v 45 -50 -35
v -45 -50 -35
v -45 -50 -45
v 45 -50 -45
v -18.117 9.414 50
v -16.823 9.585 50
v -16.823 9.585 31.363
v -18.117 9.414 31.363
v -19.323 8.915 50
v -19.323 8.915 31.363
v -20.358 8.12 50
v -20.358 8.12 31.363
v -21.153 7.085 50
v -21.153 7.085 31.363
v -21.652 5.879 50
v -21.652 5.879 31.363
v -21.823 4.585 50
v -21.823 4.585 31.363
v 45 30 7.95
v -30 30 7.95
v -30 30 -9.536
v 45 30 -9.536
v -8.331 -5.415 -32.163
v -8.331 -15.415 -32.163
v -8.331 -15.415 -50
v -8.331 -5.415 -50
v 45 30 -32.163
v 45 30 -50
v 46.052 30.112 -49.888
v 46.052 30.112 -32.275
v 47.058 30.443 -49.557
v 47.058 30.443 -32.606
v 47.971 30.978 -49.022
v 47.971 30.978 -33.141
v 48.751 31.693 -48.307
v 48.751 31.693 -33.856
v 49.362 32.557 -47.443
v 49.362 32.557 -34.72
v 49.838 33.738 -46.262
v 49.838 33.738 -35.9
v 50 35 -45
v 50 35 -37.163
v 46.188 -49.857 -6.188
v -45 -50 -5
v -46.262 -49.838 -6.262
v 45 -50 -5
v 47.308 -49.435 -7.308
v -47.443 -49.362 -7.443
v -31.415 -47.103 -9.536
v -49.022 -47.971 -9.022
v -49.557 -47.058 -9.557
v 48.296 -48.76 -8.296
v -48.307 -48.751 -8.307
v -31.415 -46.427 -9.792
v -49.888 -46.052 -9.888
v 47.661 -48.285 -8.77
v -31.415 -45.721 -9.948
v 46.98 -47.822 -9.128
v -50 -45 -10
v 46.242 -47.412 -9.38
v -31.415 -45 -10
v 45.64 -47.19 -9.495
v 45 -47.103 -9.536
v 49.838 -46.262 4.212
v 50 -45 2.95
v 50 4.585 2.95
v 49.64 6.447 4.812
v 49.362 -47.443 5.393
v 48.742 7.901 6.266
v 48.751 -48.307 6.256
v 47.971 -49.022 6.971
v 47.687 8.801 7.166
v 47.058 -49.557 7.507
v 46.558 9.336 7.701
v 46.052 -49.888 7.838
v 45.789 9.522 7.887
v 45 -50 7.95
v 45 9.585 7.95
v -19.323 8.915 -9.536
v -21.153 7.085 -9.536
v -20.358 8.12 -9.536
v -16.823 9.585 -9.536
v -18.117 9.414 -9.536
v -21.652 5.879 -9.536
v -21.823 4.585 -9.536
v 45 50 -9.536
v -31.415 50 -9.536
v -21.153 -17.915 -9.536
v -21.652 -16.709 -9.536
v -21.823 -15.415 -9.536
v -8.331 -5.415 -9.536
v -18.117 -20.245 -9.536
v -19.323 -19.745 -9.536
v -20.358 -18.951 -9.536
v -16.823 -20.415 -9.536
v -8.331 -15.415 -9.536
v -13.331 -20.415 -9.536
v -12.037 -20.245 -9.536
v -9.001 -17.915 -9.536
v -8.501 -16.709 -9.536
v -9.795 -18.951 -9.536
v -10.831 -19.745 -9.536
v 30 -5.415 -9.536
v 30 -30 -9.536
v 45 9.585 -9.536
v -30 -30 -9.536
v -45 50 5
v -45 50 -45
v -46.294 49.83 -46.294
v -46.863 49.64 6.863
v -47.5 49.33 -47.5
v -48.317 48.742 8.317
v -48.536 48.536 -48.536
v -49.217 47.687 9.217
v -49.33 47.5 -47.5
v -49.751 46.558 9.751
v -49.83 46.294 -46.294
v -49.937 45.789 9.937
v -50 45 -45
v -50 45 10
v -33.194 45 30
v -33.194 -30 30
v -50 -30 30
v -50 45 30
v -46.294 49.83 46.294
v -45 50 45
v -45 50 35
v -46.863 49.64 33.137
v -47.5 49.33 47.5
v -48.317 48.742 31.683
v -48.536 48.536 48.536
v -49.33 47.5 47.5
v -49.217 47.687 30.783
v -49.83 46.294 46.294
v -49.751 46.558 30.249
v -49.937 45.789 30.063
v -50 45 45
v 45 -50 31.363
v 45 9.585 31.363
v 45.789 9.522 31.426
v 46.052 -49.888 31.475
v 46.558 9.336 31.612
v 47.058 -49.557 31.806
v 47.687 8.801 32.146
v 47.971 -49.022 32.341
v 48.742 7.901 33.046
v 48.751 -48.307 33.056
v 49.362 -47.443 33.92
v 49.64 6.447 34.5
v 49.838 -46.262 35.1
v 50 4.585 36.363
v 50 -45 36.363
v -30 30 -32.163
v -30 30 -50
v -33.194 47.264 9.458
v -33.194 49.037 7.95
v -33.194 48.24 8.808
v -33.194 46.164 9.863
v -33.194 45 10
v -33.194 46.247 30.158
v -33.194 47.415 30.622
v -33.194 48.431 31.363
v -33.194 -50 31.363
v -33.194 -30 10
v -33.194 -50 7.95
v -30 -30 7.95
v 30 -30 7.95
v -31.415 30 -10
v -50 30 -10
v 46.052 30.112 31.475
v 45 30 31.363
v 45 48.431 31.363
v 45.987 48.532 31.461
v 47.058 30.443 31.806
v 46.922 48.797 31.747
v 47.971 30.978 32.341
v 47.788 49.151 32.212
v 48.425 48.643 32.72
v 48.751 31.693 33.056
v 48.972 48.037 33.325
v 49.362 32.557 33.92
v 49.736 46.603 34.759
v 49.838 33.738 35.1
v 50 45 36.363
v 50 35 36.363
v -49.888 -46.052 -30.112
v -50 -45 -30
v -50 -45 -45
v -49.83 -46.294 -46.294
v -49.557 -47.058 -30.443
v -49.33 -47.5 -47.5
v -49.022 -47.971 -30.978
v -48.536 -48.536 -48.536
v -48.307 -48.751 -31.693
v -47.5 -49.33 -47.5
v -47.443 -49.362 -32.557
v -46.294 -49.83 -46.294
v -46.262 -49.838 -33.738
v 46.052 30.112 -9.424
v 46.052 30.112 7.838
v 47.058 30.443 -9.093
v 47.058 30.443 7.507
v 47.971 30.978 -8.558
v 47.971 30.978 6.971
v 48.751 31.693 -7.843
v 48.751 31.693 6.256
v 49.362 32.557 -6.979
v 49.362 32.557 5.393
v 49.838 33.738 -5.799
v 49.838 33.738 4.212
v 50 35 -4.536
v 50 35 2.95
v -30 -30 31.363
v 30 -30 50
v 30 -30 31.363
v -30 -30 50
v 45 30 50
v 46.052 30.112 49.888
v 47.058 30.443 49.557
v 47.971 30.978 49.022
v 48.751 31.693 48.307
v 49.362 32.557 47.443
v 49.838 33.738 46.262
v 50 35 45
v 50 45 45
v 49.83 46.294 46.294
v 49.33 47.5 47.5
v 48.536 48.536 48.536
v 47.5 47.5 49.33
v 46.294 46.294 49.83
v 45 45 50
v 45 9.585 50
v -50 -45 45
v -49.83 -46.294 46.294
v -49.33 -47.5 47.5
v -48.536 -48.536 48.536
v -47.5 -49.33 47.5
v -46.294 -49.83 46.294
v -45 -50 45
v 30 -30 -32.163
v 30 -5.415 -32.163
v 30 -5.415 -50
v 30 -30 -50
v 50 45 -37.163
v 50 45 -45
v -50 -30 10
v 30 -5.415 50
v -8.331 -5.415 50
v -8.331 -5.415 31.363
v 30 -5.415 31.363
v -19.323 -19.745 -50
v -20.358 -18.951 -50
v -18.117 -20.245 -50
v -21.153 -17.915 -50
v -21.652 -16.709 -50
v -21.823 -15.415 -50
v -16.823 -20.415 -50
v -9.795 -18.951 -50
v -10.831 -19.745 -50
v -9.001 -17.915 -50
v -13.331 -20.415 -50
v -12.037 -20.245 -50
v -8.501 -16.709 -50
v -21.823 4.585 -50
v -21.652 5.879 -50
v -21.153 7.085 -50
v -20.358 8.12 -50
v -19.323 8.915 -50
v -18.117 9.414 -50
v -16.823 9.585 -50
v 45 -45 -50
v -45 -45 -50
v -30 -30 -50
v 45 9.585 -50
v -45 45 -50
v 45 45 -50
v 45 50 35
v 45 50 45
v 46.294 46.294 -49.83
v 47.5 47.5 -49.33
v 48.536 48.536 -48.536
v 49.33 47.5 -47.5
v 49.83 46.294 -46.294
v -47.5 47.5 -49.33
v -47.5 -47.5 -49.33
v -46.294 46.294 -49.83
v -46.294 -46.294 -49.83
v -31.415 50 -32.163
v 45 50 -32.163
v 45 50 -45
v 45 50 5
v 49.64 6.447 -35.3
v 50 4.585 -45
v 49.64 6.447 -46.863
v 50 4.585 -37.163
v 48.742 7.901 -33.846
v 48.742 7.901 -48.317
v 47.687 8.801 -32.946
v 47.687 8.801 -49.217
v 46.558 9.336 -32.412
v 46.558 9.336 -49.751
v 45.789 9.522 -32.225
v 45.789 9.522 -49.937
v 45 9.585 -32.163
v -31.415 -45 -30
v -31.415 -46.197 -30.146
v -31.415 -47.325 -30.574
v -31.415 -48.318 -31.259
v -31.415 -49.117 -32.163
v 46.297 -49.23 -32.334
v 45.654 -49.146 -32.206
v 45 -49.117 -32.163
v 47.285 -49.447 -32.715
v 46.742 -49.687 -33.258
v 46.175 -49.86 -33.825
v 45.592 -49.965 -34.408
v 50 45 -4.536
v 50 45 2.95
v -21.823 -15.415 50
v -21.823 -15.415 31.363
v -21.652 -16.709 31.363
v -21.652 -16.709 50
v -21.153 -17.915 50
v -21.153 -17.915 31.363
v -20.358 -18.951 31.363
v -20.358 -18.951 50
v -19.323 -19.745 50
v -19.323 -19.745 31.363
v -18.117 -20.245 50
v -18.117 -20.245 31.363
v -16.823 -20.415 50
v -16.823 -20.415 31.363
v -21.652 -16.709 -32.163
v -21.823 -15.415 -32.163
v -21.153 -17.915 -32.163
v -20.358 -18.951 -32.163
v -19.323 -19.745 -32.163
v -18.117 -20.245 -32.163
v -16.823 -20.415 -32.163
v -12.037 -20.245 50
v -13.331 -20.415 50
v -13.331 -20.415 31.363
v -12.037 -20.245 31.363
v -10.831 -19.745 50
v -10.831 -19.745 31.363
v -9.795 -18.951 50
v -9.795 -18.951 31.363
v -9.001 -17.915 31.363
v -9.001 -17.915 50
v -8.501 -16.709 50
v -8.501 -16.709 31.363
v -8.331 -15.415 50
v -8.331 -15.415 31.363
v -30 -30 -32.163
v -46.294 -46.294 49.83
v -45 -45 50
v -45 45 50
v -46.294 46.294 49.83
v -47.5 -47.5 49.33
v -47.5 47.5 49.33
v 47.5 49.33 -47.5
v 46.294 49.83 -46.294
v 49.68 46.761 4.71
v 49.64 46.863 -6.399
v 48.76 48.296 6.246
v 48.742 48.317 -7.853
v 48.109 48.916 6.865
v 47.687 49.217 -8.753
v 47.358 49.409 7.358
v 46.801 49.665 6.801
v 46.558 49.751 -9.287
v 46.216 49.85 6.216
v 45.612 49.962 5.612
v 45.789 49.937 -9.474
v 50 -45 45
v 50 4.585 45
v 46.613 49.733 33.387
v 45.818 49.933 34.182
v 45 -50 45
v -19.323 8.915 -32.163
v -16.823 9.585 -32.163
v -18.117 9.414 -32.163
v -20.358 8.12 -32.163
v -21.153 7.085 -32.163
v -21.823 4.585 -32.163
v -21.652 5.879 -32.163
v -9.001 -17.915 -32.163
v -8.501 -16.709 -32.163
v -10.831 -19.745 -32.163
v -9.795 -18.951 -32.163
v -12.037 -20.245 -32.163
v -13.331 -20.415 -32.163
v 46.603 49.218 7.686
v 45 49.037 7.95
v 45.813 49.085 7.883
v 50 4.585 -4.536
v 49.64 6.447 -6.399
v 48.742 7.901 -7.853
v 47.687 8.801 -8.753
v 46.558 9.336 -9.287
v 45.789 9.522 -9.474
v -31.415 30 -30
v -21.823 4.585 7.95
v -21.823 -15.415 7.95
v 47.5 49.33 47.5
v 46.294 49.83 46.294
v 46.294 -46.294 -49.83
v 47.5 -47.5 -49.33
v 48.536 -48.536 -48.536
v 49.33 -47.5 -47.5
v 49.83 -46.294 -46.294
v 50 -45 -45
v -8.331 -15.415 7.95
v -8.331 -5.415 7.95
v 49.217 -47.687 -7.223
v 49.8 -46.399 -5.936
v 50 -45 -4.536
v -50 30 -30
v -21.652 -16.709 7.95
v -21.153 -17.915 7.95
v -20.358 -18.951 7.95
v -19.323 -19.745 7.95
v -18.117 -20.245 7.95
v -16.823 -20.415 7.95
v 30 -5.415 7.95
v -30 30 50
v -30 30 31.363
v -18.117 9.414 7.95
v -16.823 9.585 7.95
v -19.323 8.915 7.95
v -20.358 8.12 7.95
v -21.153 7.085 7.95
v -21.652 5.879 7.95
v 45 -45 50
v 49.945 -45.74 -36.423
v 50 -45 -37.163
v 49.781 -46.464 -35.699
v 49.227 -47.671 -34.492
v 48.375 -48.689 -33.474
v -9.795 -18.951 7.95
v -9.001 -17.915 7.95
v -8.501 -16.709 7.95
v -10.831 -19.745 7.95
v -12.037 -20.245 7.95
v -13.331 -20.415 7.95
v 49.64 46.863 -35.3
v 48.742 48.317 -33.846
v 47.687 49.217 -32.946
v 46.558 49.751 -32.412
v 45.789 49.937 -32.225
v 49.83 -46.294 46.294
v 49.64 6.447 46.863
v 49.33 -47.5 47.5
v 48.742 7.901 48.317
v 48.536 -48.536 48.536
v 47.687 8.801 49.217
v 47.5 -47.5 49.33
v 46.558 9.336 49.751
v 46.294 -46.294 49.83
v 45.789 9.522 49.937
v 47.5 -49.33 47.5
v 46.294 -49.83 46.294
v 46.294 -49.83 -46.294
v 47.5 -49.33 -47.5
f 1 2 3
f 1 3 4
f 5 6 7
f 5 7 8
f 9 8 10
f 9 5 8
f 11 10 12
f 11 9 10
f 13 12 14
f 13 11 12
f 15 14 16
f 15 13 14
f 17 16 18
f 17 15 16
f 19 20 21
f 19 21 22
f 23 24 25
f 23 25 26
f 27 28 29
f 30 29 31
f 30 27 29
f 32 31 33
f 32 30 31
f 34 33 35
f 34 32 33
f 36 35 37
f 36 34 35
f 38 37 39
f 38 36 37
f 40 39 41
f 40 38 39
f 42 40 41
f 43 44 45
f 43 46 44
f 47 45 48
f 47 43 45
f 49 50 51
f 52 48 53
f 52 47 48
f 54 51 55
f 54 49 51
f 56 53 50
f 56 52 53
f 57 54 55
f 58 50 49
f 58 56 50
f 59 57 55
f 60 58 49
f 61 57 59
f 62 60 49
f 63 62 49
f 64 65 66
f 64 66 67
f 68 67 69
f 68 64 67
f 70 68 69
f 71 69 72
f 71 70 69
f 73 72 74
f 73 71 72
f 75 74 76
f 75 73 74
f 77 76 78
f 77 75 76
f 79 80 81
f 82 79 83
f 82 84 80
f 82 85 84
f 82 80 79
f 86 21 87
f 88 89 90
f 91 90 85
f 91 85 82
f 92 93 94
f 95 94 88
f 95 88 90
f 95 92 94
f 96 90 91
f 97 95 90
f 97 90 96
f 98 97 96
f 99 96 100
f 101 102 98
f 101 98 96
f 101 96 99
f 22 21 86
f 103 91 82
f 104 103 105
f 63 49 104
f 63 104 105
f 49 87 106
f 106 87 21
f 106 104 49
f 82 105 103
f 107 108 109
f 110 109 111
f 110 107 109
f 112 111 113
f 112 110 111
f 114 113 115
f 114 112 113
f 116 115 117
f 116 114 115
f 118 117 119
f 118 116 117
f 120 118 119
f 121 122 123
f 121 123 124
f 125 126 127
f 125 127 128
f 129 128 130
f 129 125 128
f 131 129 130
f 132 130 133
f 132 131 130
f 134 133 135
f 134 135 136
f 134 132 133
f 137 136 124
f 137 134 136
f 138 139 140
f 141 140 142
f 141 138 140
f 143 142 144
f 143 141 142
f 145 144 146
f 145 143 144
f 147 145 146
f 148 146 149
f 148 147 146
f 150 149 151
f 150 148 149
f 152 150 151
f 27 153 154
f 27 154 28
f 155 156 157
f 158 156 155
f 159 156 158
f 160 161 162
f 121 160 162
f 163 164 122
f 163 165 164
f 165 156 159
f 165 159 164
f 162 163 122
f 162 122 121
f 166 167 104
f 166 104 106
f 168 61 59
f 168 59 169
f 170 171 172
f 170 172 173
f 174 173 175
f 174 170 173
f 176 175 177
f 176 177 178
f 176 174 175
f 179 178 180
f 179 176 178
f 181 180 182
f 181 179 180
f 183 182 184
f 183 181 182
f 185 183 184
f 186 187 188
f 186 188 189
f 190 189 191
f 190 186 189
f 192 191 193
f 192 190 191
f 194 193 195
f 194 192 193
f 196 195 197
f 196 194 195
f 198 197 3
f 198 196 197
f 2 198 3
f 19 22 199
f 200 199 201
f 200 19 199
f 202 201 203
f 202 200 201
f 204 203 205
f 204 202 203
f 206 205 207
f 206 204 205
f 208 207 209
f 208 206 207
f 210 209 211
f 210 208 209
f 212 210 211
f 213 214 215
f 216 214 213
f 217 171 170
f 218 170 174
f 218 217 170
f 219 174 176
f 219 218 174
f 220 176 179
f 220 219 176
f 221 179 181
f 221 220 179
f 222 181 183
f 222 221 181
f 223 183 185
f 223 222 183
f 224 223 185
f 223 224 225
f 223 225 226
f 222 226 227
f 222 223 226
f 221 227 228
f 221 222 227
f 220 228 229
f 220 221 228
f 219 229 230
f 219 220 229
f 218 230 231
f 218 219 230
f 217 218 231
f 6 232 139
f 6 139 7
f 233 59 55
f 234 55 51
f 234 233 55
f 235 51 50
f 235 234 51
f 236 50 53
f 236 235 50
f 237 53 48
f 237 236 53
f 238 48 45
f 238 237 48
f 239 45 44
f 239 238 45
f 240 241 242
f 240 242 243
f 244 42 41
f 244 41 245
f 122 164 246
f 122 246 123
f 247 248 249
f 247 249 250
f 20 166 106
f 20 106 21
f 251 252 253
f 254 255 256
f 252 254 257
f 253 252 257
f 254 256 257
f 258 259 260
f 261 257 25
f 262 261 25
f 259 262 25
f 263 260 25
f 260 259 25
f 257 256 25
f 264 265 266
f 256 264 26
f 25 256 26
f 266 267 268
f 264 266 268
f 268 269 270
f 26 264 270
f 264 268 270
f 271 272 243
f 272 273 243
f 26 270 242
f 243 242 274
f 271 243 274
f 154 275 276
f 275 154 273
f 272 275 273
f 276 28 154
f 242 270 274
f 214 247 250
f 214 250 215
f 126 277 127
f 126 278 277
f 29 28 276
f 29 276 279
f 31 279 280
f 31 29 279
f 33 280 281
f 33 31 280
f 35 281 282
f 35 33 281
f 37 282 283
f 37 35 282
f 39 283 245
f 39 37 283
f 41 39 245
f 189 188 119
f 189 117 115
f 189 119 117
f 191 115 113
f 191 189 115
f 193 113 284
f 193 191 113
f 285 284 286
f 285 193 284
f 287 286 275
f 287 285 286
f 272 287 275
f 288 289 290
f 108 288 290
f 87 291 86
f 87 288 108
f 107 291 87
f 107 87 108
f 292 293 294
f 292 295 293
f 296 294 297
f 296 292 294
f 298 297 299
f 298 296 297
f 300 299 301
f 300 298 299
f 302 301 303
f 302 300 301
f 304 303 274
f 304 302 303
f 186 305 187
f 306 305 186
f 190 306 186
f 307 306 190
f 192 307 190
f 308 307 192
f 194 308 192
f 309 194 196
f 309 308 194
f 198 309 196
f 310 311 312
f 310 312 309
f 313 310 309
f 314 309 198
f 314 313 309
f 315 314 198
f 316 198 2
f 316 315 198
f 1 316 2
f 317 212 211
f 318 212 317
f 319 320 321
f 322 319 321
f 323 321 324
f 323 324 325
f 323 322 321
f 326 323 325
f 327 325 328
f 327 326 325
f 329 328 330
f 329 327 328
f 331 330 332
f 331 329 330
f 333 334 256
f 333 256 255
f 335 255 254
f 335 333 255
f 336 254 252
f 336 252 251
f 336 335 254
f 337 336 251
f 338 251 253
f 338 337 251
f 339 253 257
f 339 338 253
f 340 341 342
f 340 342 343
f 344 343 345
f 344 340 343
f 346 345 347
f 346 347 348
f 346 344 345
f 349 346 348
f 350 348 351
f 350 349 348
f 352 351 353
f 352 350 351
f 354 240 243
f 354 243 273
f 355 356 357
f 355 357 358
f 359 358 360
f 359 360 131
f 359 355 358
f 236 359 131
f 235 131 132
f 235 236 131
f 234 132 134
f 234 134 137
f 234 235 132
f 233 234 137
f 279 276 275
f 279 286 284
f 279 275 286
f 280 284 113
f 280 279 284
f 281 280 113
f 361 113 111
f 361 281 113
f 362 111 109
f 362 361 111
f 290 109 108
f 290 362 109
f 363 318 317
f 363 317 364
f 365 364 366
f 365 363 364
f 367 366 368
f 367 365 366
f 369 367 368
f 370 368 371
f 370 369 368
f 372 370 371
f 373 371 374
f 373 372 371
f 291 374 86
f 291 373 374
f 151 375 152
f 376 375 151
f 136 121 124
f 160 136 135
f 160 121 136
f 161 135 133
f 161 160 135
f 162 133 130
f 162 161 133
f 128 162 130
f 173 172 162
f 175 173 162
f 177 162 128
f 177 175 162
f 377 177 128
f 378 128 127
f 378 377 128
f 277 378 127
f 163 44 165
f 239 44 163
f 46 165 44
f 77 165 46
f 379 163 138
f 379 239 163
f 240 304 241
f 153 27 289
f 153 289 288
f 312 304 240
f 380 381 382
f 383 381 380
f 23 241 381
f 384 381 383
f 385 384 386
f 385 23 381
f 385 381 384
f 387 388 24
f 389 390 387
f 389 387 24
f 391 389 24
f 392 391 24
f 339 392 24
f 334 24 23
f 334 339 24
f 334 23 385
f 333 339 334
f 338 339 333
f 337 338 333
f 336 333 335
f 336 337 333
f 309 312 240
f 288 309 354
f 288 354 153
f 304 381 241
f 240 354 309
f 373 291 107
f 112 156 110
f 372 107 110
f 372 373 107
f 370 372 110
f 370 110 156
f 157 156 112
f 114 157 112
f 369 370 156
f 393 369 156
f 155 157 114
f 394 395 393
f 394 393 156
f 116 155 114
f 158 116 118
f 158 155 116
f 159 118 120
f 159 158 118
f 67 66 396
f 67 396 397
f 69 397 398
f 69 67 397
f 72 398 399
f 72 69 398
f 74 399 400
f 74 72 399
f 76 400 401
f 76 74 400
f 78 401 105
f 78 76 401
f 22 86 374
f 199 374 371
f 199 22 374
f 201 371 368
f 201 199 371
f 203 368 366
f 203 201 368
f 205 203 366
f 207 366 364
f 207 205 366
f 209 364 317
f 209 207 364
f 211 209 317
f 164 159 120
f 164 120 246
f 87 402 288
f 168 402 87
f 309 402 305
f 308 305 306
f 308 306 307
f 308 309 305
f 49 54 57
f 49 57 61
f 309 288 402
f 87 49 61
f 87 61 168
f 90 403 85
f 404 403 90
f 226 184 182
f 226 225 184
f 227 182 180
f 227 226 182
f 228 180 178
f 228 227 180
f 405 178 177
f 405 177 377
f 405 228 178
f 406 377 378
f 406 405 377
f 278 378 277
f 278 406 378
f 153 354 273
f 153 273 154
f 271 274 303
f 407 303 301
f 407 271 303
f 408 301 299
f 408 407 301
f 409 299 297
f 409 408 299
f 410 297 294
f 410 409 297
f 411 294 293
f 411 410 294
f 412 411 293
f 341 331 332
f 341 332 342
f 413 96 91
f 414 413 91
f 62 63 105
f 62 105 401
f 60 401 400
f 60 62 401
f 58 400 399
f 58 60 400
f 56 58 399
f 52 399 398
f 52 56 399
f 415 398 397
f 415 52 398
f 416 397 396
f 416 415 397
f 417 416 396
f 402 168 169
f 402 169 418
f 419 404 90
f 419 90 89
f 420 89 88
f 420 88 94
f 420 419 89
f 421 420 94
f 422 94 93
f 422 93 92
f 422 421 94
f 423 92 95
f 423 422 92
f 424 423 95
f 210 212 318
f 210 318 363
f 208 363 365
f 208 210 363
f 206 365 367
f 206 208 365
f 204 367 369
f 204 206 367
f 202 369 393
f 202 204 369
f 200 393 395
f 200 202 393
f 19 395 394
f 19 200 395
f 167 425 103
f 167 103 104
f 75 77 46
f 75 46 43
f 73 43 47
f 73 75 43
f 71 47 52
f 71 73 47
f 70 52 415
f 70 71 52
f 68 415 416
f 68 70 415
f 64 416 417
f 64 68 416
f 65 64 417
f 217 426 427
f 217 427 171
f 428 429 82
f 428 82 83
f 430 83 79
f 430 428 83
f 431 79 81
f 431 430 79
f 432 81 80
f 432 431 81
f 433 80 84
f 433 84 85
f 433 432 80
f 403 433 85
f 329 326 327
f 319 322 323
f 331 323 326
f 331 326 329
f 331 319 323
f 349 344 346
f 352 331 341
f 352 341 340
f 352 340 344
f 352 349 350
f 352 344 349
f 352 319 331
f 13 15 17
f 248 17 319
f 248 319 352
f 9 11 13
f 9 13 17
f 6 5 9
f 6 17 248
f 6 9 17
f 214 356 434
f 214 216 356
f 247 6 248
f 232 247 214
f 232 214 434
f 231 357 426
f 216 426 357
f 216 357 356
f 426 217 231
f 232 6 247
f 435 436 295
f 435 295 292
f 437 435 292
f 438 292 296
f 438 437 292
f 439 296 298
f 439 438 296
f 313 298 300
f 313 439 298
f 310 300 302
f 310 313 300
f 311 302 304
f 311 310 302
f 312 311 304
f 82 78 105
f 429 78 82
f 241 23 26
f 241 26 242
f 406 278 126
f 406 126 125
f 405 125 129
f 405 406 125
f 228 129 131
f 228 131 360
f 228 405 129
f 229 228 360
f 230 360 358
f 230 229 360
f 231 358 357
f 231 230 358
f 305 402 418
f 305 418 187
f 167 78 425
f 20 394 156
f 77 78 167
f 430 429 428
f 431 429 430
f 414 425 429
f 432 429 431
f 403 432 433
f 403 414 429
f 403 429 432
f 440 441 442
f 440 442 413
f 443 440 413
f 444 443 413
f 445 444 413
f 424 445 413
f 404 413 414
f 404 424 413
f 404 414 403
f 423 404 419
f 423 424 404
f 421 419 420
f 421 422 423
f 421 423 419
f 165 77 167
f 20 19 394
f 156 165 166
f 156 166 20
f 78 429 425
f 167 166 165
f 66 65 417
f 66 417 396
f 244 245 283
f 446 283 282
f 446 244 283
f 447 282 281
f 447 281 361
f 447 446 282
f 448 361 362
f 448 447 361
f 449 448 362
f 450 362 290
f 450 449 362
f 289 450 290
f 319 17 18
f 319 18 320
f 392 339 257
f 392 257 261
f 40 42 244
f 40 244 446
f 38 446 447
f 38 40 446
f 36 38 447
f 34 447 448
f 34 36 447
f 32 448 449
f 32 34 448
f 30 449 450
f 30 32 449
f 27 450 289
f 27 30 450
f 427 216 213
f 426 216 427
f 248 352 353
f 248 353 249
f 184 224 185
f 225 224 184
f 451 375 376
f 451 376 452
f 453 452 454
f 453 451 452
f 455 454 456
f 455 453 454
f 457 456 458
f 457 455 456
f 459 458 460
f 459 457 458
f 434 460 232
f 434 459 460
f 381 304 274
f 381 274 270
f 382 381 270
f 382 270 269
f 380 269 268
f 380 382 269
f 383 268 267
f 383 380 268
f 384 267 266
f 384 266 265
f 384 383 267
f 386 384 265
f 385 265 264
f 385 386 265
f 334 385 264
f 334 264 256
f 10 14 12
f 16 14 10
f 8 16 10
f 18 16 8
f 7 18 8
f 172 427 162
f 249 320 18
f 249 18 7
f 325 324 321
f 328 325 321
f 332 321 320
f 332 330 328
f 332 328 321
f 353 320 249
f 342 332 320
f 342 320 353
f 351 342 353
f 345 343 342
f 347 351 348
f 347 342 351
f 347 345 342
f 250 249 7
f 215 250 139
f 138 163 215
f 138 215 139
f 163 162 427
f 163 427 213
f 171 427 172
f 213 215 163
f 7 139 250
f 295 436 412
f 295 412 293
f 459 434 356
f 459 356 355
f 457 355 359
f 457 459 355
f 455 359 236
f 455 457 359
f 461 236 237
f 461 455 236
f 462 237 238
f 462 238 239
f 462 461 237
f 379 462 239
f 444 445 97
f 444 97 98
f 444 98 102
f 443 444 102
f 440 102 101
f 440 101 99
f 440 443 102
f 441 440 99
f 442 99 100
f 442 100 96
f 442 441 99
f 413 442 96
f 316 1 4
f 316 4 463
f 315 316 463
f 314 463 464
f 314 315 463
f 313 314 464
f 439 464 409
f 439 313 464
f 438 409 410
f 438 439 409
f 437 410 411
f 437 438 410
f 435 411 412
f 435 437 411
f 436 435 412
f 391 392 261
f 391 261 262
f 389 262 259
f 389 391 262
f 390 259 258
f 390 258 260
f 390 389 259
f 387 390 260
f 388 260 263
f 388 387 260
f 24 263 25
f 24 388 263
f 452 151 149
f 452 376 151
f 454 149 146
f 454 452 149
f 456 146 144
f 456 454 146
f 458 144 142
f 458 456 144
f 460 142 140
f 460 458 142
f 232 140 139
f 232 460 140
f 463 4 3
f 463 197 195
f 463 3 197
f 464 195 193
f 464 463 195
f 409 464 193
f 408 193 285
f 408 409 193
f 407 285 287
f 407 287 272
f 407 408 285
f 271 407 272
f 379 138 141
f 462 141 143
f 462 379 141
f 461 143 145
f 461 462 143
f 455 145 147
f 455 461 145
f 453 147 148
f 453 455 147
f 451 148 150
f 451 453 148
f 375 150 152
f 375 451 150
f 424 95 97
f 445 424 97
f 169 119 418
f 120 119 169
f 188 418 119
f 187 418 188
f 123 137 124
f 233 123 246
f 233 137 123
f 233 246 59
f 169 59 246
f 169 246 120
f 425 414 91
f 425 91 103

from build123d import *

# Parameters (mm, degrees)
F3_DEPTH = 50
F4_DEPTH = 50
F5_DEPTH = 50


with BuildPart() as f3:
    # F0 (on Top) → F3 (new body, symmetric)
    with BuildSketch(Plane.XY):
        with BuildLine():
            Line((-30, 30), (45, 30))
            ThreePointArc((45, 30), (48.535534, 31.464466), (50, 35))
            Line((50, 35), (50, 45))
            ThreePointArc((50, 45), (48.535534, 48.535534), (45, 50))
            Line((45, 50), (-45, 50))
            ThreePointArc((-45, 50), (-48.535534, 48.535534), (-50, 45))
            Line((-50, 45), (-50, -45))
            ThreePointArc((-50, -45), (-48.535534, -48.535534), (-45, -50))
            Line((-45, -50), (45, -50))
            ThreePointArc((45, -50), (48.535534, -48.535534), (50, -45))
            Line((50, -45), (50, 4.584678))
            ThreePointArc((50, 4.584678), (48.535534, 8.120212), (45, 9.584678))
            Line((45, 9.584678), (-16.822587, 9.584678))
            ThreePointArc((-16.822587, 9.584678), (-20.358121, 8.120212), (-21.822587, 4.584678))
            Line((-21.822587, 4.584678), (-21.822587, -15.415322))
            ThreePointArc((-21.822587, -15.415322), (-20.358121, -18.950856), (-16.822587, -20.415322))
            Line((-16.822587, -20.415322), (-13.330647, -20.415322))
            ThreePointArc((-13.330647, -20.415322), (-9.795113, -18.950856), (-8.330647, -15.415322))
            Line((-8.330647, -15.415322), (-8.330647, -5.415322))
            Line((-8.330647, -5.415322), (30, -5.415322))
            Line((30, -5.415322), (30, -30))
            Line((30, -30), (-30, -30))
            Line((-30, -30), (-30, 30))
        make_face()
    extrude(amount=F3_DEPTH, both=True)

    # F1 (on Front) → F4 (intersect, symmetric)
    with BuildSketch(Plane.XZ):
        with BuildLine():
            Line((-33.193547, 7.949598), (-33.193547, 31.362906))
            Line((-33.193547, 31.362906), (45, 31.362906))
            ThreePointArc((45, 31.362906), (48.535534, 32.827372), (50, 36.362906))
            Line((50, 36.362906), (50, 45))
            ThreePointArc((50, 45), (48.535534, 48.535534), (45, 50))
            Line((45, 50), (-45, 50))
            ThreePointArc((-45, 50), (-48.535534, 48.535534), (-50, 45))
            Line((-50, 45), (-50, -45))
            ThreePointArc((-50, -45), (-48.535534, -48.535534), (-45, -50))
            Line((-45, -50), (45, -50))
            ThreePointArc((45, -50), (48.535534, -48.535534), (50, -45))
            Line((50, -45), (50, -37.162689))
            ThreePointArc((50, -37.162689), (48.535534, -33.627155), (45, -32.162689))
            Line((45, -32.162689), (-31.415325, -32.162689))
            Line((-31.415325, -32.162689), (-31.415325, -9.536289))
            Line((-31.415325, -9.536289), (45, -9.536289))
            ThreePointArc((45, -9.536289), (48.535534, -8.071823), (50, -4.536289))
            Line((50, -4.536289), (50, 2.949598))
            ThreePointArc((50, 2.949598), (48.535534, 6.485132), (45, 7.949598))
            Line((45, 7.949598), (-33.193547, 7.949598))
        make_face()
    extrude(amount=F4_DEPTH, both=True, mode=Mode.INTERSECT)

    # F2 (on Right) → F5 (intersect, symmetric)
    with BuildSketch(Plane.YZ):
        with BuildLine():
            ThreePointArc((-45, 50), (-48.535534, 48.535534), (-50, 45))
            Line((-50, 45), (-50, -5))
            ThreePointArc((-50, -5), (-48.535534, -8.535534), (-45, -10))
            Line((-45, -10), (30, -10))
            Line((30, -10), (30, -30))
            Line((30, -30), (-45, -30))
            ThreePointArc((-45, -30), (-48.535534, -31.464466), (-50, -35))
            Line((-50, -35), (-50, -45))
            ThreePointArc((-50, -45), (-48.535534, -48.535534), (-45, -50))
            Line((-45, -50), (45, -50))
            ThreePointArc((45, -50), (48.535534, -48.535534), (50, -45))
            Line((50, -45), (50, 5))
            ThreePointArc((50, 5), (48.535534, 8.535534), (45, 10))
            Line((45, 10), (-30, 10))
            Line((-30, 10), (-30, 30))
            Line((-30, 30), (45, 30))
            ThreePointArc((45, 30), (48.535534, 31.464466), (50, 35))
            Line((50, 35), (50, 45))
            ThreePointArc((50, 45), (48.535534, 48.535534), (45, 50))
            Line((45, 50), (-45, 50))
        make_face()
    extrude(amount=F5_DEPTH, both=True, mode=Mode.INTERSECT)


solid = f3.part
